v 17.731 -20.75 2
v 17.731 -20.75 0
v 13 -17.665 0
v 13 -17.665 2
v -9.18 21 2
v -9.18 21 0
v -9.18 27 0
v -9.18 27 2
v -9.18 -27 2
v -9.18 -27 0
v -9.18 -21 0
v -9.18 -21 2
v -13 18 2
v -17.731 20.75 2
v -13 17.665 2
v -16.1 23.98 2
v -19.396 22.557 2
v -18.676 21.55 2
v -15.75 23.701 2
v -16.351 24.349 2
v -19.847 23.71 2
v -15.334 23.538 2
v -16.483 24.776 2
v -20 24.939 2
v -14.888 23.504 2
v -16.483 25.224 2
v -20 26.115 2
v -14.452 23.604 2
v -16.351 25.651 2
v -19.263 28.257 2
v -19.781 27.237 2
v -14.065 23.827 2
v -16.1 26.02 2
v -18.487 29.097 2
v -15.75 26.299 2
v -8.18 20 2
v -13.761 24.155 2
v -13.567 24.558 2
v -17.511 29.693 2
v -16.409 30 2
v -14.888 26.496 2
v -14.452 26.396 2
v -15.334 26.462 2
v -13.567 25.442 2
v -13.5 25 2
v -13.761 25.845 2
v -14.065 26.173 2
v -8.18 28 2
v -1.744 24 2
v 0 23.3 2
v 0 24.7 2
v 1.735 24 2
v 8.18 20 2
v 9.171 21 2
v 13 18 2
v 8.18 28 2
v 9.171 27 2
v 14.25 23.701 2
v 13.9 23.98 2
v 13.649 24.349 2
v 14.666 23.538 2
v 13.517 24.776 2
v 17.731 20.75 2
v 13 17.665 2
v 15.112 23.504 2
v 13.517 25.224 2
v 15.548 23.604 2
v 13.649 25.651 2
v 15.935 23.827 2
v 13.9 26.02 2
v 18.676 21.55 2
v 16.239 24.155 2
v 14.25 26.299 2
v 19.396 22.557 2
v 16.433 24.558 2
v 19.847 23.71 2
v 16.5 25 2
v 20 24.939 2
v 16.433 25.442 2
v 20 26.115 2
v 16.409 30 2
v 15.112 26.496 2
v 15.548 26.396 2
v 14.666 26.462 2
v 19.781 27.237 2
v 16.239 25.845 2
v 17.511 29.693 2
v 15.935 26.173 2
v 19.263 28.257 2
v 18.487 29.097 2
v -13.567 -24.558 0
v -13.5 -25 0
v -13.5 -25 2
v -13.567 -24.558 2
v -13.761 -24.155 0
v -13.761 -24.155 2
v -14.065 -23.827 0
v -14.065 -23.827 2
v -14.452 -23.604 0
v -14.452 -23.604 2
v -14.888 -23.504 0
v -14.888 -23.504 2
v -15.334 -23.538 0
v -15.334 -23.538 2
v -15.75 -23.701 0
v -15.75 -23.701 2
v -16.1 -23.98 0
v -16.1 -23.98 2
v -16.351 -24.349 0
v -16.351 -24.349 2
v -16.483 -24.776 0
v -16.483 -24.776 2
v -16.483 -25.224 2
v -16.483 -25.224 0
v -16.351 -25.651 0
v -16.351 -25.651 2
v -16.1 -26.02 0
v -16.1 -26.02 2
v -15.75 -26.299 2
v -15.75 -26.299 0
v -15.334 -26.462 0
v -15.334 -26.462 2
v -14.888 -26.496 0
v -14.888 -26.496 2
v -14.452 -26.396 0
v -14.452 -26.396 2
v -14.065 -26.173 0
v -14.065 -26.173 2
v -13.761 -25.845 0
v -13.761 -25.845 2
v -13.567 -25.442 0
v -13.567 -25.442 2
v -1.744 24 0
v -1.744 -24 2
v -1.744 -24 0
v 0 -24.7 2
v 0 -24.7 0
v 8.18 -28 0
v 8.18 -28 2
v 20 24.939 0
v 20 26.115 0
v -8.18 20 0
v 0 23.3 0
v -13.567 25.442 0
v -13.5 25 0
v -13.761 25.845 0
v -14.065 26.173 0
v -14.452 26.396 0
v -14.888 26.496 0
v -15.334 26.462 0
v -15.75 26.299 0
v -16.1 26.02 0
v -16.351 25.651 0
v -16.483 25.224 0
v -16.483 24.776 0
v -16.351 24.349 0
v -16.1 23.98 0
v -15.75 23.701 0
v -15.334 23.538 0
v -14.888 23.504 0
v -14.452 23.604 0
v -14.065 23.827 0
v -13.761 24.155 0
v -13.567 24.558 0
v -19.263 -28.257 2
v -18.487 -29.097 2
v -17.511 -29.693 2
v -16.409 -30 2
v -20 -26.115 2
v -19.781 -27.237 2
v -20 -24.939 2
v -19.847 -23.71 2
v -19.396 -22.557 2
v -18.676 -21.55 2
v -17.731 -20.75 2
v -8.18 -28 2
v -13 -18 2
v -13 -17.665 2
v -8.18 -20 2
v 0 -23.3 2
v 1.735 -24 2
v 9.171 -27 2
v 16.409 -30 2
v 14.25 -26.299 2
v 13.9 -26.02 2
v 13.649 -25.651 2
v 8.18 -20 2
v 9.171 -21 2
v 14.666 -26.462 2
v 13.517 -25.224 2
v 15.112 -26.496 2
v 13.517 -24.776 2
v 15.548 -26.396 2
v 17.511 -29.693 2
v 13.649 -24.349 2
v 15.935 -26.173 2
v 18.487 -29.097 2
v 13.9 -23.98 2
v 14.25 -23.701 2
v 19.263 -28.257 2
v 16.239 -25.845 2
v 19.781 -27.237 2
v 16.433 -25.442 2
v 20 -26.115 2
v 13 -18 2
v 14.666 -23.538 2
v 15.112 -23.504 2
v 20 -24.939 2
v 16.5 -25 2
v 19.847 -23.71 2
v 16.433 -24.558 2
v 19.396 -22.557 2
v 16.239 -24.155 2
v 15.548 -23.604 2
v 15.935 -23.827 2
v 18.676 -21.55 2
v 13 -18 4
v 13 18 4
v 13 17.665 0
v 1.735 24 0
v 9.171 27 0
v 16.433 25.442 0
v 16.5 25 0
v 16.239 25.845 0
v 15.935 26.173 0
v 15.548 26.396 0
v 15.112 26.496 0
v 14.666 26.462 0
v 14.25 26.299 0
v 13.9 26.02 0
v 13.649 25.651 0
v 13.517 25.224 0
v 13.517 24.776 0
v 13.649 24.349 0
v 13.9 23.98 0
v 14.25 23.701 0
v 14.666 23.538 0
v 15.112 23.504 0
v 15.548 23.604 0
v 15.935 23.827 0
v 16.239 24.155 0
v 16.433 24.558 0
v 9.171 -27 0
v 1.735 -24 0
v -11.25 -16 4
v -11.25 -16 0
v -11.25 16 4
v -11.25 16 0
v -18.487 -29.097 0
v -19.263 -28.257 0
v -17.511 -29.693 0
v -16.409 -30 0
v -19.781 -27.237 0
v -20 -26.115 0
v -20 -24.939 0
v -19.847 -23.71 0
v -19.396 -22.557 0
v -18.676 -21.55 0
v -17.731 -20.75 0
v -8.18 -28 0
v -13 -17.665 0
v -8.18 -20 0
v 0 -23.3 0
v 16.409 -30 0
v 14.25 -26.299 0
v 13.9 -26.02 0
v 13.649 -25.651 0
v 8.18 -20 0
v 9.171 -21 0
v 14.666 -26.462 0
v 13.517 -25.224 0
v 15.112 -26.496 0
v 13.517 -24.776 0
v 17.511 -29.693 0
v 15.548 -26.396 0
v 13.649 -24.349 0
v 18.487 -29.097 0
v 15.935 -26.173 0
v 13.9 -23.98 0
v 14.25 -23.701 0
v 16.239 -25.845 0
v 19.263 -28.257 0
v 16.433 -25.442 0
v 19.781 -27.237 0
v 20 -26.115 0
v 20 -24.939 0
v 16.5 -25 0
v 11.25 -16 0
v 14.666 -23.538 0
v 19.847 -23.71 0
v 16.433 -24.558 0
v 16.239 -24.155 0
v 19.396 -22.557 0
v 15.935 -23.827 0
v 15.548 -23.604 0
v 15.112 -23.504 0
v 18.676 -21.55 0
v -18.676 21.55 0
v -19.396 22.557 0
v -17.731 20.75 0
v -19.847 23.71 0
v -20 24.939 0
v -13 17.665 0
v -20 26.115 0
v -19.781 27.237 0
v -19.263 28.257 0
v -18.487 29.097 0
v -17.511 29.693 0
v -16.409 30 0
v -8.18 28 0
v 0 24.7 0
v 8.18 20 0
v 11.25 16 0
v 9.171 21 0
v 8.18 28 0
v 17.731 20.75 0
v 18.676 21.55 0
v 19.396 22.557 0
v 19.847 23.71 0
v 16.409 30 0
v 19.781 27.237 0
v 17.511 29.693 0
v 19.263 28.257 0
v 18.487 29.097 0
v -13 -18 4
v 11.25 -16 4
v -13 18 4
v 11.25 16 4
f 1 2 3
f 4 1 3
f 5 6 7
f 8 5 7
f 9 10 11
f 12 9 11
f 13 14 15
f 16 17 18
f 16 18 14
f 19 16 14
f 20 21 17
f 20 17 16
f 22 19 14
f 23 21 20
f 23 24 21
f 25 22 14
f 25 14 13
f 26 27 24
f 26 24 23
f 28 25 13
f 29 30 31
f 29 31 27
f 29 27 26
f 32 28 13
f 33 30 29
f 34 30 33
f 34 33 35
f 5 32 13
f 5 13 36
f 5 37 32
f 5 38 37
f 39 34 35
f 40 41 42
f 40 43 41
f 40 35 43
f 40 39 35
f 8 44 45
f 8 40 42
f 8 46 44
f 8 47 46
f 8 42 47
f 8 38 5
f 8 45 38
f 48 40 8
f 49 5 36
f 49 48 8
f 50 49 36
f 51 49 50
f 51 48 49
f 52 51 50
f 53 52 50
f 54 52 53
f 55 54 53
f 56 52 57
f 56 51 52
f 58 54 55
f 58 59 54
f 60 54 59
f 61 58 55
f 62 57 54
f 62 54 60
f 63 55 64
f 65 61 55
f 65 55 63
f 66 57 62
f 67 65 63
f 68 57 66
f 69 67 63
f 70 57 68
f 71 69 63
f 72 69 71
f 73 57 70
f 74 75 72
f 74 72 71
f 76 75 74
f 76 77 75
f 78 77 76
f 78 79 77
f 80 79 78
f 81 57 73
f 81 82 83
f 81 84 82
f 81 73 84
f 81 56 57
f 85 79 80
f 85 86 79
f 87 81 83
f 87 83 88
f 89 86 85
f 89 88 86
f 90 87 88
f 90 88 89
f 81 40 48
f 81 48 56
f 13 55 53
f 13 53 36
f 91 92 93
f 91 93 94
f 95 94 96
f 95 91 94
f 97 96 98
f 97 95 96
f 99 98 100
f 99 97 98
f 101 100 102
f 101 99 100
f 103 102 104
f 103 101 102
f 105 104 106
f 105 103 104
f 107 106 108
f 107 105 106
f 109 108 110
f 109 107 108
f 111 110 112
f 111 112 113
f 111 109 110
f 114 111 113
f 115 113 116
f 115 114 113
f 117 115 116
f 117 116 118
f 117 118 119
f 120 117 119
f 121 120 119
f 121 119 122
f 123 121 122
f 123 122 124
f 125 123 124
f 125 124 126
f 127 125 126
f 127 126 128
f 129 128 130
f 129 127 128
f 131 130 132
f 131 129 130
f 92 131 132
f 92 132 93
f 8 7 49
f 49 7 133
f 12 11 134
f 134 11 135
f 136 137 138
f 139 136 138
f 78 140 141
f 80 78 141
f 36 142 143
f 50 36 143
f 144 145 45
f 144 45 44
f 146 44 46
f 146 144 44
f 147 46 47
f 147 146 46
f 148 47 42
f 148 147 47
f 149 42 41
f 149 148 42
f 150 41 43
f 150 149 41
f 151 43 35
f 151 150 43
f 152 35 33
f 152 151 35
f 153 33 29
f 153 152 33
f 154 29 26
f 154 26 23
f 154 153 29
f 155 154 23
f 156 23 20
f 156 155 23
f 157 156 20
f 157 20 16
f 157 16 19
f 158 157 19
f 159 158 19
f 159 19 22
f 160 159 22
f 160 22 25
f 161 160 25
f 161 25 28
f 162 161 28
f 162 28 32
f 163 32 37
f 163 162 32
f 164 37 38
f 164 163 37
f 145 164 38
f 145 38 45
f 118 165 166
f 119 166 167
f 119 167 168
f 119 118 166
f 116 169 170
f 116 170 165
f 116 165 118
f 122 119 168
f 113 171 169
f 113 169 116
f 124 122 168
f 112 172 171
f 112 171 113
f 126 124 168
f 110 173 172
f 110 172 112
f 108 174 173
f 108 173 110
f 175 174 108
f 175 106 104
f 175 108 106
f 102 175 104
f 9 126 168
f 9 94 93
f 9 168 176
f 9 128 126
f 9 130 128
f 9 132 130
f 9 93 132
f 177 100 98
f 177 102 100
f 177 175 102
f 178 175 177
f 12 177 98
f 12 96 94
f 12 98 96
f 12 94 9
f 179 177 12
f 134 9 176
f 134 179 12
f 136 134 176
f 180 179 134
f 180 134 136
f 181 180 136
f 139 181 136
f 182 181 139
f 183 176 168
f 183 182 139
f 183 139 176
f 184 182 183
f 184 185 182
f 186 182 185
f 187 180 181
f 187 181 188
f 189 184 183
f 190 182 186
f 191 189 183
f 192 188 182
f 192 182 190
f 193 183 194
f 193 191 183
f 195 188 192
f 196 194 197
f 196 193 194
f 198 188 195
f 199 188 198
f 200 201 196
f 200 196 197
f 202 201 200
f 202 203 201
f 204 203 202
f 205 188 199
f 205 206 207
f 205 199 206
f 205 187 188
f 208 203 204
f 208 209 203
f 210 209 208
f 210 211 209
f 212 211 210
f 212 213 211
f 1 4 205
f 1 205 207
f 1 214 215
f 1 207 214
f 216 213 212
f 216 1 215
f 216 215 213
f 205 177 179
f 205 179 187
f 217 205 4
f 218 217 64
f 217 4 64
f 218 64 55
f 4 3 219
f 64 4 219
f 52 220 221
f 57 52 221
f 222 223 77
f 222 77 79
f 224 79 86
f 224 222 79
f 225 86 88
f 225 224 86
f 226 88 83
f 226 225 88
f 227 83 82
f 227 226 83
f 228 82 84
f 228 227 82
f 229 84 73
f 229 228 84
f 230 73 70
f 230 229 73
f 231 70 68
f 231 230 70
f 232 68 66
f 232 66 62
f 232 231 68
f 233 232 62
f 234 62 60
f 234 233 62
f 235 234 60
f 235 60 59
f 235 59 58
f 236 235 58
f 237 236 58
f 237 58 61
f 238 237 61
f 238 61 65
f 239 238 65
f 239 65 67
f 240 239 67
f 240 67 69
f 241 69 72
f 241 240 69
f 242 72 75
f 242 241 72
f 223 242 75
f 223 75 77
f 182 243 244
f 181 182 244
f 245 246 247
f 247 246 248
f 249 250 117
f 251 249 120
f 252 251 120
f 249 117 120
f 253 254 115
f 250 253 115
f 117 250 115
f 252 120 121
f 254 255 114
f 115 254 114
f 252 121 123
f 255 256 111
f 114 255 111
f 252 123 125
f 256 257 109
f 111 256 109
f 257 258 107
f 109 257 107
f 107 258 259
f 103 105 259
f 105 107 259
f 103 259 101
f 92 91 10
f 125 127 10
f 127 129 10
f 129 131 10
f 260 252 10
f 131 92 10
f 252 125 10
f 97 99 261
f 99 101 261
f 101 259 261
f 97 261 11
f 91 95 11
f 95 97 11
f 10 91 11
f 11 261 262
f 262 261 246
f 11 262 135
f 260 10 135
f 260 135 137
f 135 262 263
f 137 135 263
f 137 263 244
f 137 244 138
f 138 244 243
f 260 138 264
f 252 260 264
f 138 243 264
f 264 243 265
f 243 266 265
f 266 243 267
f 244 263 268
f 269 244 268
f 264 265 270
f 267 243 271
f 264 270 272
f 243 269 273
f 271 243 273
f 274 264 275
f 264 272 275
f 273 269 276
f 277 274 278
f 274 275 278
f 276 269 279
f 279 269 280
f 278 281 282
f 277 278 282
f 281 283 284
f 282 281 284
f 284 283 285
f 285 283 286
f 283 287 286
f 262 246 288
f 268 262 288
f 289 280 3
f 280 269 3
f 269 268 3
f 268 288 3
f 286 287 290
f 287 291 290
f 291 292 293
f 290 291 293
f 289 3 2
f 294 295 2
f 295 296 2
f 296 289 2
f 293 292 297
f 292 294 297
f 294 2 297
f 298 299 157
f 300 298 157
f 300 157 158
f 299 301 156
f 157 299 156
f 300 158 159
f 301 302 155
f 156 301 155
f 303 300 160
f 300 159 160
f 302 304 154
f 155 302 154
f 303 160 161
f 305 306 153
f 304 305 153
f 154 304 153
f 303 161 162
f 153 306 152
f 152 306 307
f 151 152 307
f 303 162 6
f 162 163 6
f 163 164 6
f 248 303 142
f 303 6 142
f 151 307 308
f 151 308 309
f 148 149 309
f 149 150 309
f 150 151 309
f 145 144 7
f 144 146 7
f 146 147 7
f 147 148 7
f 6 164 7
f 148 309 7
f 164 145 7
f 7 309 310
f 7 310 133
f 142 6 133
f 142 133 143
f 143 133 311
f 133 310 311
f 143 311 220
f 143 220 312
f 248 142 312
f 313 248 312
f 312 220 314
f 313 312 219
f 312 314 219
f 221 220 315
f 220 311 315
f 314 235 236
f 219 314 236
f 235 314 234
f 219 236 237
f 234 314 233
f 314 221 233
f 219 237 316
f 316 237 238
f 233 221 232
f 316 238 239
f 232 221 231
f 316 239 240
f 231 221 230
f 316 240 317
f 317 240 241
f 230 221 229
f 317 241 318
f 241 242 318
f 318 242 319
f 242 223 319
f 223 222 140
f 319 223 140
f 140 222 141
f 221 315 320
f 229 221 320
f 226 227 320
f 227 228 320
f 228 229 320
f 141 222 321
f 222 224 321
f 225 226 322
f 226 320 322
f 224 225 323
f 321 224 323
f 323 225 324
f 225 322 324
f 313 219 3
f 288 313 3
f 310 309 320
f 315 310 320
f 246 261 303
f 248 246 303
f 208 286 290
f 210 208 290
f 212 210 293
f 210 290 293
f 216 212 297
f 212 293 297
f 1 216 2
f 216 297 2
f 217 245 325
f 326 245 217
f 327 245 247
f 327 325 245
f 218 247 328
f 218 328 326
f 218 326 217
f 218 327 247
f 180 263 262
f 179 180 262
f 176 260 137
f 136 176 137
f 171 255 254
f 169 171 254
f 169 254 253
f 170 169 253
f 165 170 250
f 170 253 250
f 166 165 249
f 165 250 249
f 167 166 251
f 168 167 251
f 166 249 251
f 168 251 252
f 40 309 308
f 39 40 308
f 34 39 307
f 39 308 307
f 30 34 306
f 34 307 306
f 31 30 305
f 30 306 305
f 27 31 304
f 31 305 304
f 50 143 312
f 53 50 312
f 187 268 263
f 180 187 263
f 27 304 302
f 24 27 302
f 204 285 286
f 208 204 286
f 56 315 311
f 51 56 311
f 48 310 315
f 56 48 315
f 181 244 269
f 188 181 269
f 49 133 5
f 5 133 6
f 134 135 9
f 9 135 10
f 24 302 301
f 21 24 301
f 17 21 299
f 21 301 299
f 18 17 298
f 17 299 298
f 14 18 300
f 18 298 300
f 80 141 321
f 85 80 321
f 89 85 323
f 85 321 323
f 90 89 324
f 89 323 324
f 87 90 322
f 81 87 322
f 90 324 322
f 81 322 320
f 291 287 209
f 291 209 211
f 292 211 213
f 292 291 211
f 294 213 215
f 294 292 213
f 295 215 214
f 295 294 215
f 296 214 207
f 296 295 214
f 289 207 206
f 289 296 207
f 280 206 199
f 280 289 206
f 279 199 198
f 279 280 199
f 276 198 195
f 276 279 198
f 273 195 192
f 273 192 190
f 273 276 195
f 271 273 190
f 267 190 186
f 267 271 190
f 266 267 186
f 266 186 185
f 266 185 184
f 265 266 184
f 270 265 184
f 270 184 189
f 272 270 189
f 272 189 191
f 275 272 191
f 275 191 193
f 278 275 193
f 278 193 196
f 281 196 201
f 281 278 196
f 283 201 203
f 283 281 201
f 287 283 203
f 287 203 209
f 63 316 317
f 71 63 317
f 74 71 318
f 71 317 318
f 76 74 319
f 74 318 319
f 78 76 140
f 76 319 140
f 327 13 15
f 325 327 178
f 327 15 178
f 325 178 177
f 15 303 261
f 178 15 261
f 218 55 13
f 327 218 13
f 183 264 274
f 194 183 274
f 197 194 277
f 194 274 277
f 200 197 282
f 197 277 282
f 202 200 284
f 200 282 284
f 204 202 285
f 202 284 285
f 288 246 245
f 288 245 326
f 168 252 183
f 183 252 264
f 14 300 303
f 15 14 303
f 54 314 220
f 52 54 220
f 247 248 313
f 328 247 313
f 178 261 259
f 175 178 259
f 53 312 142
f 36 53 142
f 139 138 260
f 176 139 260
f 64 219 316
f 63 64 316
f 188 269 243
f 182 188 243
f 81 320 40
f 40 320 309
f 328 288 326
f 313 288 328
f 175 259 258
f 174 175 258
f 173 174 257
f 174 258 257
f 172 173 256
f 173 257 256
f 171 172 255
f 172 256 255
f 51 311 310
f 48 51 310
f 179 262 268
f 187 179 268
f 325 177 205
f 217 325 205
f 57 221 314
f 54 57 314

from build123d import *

# Parameters (mm, degrees)
F0_R     = 3.5
F0_R_2   = 1.5
F1_DEPTH = 2
F0_W     = 22.5
F0_H     = 32
F2_DEPTH = 4


with BuildPart() as f1:
    # F0 (on Top) → F1 (new body)
    with BuildSketch(Plane.XY):
        with BuildLine():
            ThreePointArc((20, 26.114874), (18.904278, 28.704066), (16.409269, 30))
            Line((16.409269, 30), (-16.409269, 30))
            ThreePointArc((-16.409269, 30), (-18.904278, 28.704066), (-20, 26.114874))
            Line((-20, 26.114874), (-20, 24.938533))
            ThreePointArc((-20, 24.938533), (-19.396294, 22.556811), (-17.73096, 20.750233))
            Line((-17.73096, 20.750233), (-13, 17.665434))
            Line((-13, 17.665434), (-13, 18))
            Line((-13, 18), (13, 18))
            Line((13, 18), (13, 17.665434))
            Line((13, 17.665434), (17.73096, 20.750233))
            ThreePointArc((17.73096, 20.750233), (19.396294, 22.556811), (20, 24.938533))
            Line((20, 24.938533), (20, 26.114874))
        make_face()
        with Locations((-15, 25)):
            Circle(F0_R, mode=Mode.SUBTRACT)
        Polygon((-9.18, 27), (-9.18, 28), (-8.18, 28), (8.18, 28), (9.170838, 28), (9.170838, 27), (9.170838, 21), (9.170838, 20), (8.18, 20), (-8.18, 20), (-9.18, 20), (-9.18, 21), align=None, mode=Mode.SUBTRACT)
        with Locations((15, 25)):
            Circle(F0_R, mode=Mode.SUBTRACT)
        with BuildLine():
            Line((17.73096, -20.750233), (13, -17.665434))
            Line((13, -17.665434), (13, -18))
            Line((13, -18), (-13, -18))
            Line((-13, -18), (-13, -17.665434))
            Line((-13, -17.665434), (-17.73096, -20.750233))
            ThreePointArc((-17.73096, -20.750233), (-19.396294, -22.556811), (-20, -24.938533))
            Line((-20, -24.938533), (-20, -26.114874))
            ThreePointArc((-20, -26.114874), (-18.904278, -28.704066), (-16.409269, -30))
            Line((-16.409269, -30), (16.409269, -30))
            ThreePointArc((16.409269, -30), (18.904278, -28.704066), (20, -26.114874))
            Line((20, -26.114874), (20, -24.938533))
            ThreePointArc((20, -24.938533), (19.396294, -22.556811), (17.73096, -20.750233))
        make_face()
        with Locations((-15, -25)):
            Circle(F0_R, mode=Mode.SUBTRACT)
        Polygon((-8.18, -20), (8.18, -20), (9.170838, -20), (9.170838, -21), (9.170838, -27), (9.170838, -28), (8.18, -28), (-8.18, -28), (-9.18, -28), (-9.18, -27), (-9.18, -21), (-9.18, -20), align=None, mode=Mode.SUBTRACT)
        with Locations((15, -25)):
            Circle(F0_R, mode=Mode.SUBTRACT)
        with Locations((-15, -25)):
            Circle(F0_R)
        with Locations((-15, -25)):
            Circle(F0_R_2, mode=Mode.SUBTRACT)
        with Locations((15, -25)):
            Circle(F0_R)
        with Locations((15, -25)):
            Circle(F0_R_2, mode=Mode.SUBTRACT)
        with Locations((15, 25)):
            Circle(F0_R)
        with Locations((15, 25)):
            Circle(F0_R_2, mode=Mode.SUBTRACT)
        with Locations((-15, 25)):
            Circle(F0_R)
        with Locations((-15, 25)):
            Circle(F0_R_2, mode=Mode.SUBTRACT)
        Polygon((-8.18, 28), (-9.18, 28), (-9.18, 27), (-1.743927, 24), (-9.18, 21), (-9.18, 20), (-8.18, 20), (0, 23.300129), (8.18, 20), (9.170838, 20), (9.170838, 21), (1.734764, 24), (9.170838, 27), (9.170838, 28), (8.18, 28), (0, 24.699871), align=None)
        Polygon((9.170838, -20), (8.18, -20), (0, -23.300129), (-8.18, -20), (-9.18, -20), (-9.18, -21), (-1.743927, -24), (-9.18, -27), (-9.18, -28), (-8.18, -28), (0, -24.699871), (8.18, -28), (9.170838, -28), (9.170838, -27), (1.734764, -24), (9.170838, -21), align=None)
    extrude(amount=F1_DEPTH)

    # F0 (on Top) → F2 (join)
    with BuildSketch(Plane.XY):
        Polygon((13, -17.665434), (13, 17.665434), (13, 18), (-13, 18), (-13, 17.665434), (-13, -17.665434), (-13, -18), (13, -18), align=None)
        Rectangle(F0_W, F0_H, mode=Mode.SUBTRACT)
    extrude(amount=F2_DEPTH)


solid = f1.part
